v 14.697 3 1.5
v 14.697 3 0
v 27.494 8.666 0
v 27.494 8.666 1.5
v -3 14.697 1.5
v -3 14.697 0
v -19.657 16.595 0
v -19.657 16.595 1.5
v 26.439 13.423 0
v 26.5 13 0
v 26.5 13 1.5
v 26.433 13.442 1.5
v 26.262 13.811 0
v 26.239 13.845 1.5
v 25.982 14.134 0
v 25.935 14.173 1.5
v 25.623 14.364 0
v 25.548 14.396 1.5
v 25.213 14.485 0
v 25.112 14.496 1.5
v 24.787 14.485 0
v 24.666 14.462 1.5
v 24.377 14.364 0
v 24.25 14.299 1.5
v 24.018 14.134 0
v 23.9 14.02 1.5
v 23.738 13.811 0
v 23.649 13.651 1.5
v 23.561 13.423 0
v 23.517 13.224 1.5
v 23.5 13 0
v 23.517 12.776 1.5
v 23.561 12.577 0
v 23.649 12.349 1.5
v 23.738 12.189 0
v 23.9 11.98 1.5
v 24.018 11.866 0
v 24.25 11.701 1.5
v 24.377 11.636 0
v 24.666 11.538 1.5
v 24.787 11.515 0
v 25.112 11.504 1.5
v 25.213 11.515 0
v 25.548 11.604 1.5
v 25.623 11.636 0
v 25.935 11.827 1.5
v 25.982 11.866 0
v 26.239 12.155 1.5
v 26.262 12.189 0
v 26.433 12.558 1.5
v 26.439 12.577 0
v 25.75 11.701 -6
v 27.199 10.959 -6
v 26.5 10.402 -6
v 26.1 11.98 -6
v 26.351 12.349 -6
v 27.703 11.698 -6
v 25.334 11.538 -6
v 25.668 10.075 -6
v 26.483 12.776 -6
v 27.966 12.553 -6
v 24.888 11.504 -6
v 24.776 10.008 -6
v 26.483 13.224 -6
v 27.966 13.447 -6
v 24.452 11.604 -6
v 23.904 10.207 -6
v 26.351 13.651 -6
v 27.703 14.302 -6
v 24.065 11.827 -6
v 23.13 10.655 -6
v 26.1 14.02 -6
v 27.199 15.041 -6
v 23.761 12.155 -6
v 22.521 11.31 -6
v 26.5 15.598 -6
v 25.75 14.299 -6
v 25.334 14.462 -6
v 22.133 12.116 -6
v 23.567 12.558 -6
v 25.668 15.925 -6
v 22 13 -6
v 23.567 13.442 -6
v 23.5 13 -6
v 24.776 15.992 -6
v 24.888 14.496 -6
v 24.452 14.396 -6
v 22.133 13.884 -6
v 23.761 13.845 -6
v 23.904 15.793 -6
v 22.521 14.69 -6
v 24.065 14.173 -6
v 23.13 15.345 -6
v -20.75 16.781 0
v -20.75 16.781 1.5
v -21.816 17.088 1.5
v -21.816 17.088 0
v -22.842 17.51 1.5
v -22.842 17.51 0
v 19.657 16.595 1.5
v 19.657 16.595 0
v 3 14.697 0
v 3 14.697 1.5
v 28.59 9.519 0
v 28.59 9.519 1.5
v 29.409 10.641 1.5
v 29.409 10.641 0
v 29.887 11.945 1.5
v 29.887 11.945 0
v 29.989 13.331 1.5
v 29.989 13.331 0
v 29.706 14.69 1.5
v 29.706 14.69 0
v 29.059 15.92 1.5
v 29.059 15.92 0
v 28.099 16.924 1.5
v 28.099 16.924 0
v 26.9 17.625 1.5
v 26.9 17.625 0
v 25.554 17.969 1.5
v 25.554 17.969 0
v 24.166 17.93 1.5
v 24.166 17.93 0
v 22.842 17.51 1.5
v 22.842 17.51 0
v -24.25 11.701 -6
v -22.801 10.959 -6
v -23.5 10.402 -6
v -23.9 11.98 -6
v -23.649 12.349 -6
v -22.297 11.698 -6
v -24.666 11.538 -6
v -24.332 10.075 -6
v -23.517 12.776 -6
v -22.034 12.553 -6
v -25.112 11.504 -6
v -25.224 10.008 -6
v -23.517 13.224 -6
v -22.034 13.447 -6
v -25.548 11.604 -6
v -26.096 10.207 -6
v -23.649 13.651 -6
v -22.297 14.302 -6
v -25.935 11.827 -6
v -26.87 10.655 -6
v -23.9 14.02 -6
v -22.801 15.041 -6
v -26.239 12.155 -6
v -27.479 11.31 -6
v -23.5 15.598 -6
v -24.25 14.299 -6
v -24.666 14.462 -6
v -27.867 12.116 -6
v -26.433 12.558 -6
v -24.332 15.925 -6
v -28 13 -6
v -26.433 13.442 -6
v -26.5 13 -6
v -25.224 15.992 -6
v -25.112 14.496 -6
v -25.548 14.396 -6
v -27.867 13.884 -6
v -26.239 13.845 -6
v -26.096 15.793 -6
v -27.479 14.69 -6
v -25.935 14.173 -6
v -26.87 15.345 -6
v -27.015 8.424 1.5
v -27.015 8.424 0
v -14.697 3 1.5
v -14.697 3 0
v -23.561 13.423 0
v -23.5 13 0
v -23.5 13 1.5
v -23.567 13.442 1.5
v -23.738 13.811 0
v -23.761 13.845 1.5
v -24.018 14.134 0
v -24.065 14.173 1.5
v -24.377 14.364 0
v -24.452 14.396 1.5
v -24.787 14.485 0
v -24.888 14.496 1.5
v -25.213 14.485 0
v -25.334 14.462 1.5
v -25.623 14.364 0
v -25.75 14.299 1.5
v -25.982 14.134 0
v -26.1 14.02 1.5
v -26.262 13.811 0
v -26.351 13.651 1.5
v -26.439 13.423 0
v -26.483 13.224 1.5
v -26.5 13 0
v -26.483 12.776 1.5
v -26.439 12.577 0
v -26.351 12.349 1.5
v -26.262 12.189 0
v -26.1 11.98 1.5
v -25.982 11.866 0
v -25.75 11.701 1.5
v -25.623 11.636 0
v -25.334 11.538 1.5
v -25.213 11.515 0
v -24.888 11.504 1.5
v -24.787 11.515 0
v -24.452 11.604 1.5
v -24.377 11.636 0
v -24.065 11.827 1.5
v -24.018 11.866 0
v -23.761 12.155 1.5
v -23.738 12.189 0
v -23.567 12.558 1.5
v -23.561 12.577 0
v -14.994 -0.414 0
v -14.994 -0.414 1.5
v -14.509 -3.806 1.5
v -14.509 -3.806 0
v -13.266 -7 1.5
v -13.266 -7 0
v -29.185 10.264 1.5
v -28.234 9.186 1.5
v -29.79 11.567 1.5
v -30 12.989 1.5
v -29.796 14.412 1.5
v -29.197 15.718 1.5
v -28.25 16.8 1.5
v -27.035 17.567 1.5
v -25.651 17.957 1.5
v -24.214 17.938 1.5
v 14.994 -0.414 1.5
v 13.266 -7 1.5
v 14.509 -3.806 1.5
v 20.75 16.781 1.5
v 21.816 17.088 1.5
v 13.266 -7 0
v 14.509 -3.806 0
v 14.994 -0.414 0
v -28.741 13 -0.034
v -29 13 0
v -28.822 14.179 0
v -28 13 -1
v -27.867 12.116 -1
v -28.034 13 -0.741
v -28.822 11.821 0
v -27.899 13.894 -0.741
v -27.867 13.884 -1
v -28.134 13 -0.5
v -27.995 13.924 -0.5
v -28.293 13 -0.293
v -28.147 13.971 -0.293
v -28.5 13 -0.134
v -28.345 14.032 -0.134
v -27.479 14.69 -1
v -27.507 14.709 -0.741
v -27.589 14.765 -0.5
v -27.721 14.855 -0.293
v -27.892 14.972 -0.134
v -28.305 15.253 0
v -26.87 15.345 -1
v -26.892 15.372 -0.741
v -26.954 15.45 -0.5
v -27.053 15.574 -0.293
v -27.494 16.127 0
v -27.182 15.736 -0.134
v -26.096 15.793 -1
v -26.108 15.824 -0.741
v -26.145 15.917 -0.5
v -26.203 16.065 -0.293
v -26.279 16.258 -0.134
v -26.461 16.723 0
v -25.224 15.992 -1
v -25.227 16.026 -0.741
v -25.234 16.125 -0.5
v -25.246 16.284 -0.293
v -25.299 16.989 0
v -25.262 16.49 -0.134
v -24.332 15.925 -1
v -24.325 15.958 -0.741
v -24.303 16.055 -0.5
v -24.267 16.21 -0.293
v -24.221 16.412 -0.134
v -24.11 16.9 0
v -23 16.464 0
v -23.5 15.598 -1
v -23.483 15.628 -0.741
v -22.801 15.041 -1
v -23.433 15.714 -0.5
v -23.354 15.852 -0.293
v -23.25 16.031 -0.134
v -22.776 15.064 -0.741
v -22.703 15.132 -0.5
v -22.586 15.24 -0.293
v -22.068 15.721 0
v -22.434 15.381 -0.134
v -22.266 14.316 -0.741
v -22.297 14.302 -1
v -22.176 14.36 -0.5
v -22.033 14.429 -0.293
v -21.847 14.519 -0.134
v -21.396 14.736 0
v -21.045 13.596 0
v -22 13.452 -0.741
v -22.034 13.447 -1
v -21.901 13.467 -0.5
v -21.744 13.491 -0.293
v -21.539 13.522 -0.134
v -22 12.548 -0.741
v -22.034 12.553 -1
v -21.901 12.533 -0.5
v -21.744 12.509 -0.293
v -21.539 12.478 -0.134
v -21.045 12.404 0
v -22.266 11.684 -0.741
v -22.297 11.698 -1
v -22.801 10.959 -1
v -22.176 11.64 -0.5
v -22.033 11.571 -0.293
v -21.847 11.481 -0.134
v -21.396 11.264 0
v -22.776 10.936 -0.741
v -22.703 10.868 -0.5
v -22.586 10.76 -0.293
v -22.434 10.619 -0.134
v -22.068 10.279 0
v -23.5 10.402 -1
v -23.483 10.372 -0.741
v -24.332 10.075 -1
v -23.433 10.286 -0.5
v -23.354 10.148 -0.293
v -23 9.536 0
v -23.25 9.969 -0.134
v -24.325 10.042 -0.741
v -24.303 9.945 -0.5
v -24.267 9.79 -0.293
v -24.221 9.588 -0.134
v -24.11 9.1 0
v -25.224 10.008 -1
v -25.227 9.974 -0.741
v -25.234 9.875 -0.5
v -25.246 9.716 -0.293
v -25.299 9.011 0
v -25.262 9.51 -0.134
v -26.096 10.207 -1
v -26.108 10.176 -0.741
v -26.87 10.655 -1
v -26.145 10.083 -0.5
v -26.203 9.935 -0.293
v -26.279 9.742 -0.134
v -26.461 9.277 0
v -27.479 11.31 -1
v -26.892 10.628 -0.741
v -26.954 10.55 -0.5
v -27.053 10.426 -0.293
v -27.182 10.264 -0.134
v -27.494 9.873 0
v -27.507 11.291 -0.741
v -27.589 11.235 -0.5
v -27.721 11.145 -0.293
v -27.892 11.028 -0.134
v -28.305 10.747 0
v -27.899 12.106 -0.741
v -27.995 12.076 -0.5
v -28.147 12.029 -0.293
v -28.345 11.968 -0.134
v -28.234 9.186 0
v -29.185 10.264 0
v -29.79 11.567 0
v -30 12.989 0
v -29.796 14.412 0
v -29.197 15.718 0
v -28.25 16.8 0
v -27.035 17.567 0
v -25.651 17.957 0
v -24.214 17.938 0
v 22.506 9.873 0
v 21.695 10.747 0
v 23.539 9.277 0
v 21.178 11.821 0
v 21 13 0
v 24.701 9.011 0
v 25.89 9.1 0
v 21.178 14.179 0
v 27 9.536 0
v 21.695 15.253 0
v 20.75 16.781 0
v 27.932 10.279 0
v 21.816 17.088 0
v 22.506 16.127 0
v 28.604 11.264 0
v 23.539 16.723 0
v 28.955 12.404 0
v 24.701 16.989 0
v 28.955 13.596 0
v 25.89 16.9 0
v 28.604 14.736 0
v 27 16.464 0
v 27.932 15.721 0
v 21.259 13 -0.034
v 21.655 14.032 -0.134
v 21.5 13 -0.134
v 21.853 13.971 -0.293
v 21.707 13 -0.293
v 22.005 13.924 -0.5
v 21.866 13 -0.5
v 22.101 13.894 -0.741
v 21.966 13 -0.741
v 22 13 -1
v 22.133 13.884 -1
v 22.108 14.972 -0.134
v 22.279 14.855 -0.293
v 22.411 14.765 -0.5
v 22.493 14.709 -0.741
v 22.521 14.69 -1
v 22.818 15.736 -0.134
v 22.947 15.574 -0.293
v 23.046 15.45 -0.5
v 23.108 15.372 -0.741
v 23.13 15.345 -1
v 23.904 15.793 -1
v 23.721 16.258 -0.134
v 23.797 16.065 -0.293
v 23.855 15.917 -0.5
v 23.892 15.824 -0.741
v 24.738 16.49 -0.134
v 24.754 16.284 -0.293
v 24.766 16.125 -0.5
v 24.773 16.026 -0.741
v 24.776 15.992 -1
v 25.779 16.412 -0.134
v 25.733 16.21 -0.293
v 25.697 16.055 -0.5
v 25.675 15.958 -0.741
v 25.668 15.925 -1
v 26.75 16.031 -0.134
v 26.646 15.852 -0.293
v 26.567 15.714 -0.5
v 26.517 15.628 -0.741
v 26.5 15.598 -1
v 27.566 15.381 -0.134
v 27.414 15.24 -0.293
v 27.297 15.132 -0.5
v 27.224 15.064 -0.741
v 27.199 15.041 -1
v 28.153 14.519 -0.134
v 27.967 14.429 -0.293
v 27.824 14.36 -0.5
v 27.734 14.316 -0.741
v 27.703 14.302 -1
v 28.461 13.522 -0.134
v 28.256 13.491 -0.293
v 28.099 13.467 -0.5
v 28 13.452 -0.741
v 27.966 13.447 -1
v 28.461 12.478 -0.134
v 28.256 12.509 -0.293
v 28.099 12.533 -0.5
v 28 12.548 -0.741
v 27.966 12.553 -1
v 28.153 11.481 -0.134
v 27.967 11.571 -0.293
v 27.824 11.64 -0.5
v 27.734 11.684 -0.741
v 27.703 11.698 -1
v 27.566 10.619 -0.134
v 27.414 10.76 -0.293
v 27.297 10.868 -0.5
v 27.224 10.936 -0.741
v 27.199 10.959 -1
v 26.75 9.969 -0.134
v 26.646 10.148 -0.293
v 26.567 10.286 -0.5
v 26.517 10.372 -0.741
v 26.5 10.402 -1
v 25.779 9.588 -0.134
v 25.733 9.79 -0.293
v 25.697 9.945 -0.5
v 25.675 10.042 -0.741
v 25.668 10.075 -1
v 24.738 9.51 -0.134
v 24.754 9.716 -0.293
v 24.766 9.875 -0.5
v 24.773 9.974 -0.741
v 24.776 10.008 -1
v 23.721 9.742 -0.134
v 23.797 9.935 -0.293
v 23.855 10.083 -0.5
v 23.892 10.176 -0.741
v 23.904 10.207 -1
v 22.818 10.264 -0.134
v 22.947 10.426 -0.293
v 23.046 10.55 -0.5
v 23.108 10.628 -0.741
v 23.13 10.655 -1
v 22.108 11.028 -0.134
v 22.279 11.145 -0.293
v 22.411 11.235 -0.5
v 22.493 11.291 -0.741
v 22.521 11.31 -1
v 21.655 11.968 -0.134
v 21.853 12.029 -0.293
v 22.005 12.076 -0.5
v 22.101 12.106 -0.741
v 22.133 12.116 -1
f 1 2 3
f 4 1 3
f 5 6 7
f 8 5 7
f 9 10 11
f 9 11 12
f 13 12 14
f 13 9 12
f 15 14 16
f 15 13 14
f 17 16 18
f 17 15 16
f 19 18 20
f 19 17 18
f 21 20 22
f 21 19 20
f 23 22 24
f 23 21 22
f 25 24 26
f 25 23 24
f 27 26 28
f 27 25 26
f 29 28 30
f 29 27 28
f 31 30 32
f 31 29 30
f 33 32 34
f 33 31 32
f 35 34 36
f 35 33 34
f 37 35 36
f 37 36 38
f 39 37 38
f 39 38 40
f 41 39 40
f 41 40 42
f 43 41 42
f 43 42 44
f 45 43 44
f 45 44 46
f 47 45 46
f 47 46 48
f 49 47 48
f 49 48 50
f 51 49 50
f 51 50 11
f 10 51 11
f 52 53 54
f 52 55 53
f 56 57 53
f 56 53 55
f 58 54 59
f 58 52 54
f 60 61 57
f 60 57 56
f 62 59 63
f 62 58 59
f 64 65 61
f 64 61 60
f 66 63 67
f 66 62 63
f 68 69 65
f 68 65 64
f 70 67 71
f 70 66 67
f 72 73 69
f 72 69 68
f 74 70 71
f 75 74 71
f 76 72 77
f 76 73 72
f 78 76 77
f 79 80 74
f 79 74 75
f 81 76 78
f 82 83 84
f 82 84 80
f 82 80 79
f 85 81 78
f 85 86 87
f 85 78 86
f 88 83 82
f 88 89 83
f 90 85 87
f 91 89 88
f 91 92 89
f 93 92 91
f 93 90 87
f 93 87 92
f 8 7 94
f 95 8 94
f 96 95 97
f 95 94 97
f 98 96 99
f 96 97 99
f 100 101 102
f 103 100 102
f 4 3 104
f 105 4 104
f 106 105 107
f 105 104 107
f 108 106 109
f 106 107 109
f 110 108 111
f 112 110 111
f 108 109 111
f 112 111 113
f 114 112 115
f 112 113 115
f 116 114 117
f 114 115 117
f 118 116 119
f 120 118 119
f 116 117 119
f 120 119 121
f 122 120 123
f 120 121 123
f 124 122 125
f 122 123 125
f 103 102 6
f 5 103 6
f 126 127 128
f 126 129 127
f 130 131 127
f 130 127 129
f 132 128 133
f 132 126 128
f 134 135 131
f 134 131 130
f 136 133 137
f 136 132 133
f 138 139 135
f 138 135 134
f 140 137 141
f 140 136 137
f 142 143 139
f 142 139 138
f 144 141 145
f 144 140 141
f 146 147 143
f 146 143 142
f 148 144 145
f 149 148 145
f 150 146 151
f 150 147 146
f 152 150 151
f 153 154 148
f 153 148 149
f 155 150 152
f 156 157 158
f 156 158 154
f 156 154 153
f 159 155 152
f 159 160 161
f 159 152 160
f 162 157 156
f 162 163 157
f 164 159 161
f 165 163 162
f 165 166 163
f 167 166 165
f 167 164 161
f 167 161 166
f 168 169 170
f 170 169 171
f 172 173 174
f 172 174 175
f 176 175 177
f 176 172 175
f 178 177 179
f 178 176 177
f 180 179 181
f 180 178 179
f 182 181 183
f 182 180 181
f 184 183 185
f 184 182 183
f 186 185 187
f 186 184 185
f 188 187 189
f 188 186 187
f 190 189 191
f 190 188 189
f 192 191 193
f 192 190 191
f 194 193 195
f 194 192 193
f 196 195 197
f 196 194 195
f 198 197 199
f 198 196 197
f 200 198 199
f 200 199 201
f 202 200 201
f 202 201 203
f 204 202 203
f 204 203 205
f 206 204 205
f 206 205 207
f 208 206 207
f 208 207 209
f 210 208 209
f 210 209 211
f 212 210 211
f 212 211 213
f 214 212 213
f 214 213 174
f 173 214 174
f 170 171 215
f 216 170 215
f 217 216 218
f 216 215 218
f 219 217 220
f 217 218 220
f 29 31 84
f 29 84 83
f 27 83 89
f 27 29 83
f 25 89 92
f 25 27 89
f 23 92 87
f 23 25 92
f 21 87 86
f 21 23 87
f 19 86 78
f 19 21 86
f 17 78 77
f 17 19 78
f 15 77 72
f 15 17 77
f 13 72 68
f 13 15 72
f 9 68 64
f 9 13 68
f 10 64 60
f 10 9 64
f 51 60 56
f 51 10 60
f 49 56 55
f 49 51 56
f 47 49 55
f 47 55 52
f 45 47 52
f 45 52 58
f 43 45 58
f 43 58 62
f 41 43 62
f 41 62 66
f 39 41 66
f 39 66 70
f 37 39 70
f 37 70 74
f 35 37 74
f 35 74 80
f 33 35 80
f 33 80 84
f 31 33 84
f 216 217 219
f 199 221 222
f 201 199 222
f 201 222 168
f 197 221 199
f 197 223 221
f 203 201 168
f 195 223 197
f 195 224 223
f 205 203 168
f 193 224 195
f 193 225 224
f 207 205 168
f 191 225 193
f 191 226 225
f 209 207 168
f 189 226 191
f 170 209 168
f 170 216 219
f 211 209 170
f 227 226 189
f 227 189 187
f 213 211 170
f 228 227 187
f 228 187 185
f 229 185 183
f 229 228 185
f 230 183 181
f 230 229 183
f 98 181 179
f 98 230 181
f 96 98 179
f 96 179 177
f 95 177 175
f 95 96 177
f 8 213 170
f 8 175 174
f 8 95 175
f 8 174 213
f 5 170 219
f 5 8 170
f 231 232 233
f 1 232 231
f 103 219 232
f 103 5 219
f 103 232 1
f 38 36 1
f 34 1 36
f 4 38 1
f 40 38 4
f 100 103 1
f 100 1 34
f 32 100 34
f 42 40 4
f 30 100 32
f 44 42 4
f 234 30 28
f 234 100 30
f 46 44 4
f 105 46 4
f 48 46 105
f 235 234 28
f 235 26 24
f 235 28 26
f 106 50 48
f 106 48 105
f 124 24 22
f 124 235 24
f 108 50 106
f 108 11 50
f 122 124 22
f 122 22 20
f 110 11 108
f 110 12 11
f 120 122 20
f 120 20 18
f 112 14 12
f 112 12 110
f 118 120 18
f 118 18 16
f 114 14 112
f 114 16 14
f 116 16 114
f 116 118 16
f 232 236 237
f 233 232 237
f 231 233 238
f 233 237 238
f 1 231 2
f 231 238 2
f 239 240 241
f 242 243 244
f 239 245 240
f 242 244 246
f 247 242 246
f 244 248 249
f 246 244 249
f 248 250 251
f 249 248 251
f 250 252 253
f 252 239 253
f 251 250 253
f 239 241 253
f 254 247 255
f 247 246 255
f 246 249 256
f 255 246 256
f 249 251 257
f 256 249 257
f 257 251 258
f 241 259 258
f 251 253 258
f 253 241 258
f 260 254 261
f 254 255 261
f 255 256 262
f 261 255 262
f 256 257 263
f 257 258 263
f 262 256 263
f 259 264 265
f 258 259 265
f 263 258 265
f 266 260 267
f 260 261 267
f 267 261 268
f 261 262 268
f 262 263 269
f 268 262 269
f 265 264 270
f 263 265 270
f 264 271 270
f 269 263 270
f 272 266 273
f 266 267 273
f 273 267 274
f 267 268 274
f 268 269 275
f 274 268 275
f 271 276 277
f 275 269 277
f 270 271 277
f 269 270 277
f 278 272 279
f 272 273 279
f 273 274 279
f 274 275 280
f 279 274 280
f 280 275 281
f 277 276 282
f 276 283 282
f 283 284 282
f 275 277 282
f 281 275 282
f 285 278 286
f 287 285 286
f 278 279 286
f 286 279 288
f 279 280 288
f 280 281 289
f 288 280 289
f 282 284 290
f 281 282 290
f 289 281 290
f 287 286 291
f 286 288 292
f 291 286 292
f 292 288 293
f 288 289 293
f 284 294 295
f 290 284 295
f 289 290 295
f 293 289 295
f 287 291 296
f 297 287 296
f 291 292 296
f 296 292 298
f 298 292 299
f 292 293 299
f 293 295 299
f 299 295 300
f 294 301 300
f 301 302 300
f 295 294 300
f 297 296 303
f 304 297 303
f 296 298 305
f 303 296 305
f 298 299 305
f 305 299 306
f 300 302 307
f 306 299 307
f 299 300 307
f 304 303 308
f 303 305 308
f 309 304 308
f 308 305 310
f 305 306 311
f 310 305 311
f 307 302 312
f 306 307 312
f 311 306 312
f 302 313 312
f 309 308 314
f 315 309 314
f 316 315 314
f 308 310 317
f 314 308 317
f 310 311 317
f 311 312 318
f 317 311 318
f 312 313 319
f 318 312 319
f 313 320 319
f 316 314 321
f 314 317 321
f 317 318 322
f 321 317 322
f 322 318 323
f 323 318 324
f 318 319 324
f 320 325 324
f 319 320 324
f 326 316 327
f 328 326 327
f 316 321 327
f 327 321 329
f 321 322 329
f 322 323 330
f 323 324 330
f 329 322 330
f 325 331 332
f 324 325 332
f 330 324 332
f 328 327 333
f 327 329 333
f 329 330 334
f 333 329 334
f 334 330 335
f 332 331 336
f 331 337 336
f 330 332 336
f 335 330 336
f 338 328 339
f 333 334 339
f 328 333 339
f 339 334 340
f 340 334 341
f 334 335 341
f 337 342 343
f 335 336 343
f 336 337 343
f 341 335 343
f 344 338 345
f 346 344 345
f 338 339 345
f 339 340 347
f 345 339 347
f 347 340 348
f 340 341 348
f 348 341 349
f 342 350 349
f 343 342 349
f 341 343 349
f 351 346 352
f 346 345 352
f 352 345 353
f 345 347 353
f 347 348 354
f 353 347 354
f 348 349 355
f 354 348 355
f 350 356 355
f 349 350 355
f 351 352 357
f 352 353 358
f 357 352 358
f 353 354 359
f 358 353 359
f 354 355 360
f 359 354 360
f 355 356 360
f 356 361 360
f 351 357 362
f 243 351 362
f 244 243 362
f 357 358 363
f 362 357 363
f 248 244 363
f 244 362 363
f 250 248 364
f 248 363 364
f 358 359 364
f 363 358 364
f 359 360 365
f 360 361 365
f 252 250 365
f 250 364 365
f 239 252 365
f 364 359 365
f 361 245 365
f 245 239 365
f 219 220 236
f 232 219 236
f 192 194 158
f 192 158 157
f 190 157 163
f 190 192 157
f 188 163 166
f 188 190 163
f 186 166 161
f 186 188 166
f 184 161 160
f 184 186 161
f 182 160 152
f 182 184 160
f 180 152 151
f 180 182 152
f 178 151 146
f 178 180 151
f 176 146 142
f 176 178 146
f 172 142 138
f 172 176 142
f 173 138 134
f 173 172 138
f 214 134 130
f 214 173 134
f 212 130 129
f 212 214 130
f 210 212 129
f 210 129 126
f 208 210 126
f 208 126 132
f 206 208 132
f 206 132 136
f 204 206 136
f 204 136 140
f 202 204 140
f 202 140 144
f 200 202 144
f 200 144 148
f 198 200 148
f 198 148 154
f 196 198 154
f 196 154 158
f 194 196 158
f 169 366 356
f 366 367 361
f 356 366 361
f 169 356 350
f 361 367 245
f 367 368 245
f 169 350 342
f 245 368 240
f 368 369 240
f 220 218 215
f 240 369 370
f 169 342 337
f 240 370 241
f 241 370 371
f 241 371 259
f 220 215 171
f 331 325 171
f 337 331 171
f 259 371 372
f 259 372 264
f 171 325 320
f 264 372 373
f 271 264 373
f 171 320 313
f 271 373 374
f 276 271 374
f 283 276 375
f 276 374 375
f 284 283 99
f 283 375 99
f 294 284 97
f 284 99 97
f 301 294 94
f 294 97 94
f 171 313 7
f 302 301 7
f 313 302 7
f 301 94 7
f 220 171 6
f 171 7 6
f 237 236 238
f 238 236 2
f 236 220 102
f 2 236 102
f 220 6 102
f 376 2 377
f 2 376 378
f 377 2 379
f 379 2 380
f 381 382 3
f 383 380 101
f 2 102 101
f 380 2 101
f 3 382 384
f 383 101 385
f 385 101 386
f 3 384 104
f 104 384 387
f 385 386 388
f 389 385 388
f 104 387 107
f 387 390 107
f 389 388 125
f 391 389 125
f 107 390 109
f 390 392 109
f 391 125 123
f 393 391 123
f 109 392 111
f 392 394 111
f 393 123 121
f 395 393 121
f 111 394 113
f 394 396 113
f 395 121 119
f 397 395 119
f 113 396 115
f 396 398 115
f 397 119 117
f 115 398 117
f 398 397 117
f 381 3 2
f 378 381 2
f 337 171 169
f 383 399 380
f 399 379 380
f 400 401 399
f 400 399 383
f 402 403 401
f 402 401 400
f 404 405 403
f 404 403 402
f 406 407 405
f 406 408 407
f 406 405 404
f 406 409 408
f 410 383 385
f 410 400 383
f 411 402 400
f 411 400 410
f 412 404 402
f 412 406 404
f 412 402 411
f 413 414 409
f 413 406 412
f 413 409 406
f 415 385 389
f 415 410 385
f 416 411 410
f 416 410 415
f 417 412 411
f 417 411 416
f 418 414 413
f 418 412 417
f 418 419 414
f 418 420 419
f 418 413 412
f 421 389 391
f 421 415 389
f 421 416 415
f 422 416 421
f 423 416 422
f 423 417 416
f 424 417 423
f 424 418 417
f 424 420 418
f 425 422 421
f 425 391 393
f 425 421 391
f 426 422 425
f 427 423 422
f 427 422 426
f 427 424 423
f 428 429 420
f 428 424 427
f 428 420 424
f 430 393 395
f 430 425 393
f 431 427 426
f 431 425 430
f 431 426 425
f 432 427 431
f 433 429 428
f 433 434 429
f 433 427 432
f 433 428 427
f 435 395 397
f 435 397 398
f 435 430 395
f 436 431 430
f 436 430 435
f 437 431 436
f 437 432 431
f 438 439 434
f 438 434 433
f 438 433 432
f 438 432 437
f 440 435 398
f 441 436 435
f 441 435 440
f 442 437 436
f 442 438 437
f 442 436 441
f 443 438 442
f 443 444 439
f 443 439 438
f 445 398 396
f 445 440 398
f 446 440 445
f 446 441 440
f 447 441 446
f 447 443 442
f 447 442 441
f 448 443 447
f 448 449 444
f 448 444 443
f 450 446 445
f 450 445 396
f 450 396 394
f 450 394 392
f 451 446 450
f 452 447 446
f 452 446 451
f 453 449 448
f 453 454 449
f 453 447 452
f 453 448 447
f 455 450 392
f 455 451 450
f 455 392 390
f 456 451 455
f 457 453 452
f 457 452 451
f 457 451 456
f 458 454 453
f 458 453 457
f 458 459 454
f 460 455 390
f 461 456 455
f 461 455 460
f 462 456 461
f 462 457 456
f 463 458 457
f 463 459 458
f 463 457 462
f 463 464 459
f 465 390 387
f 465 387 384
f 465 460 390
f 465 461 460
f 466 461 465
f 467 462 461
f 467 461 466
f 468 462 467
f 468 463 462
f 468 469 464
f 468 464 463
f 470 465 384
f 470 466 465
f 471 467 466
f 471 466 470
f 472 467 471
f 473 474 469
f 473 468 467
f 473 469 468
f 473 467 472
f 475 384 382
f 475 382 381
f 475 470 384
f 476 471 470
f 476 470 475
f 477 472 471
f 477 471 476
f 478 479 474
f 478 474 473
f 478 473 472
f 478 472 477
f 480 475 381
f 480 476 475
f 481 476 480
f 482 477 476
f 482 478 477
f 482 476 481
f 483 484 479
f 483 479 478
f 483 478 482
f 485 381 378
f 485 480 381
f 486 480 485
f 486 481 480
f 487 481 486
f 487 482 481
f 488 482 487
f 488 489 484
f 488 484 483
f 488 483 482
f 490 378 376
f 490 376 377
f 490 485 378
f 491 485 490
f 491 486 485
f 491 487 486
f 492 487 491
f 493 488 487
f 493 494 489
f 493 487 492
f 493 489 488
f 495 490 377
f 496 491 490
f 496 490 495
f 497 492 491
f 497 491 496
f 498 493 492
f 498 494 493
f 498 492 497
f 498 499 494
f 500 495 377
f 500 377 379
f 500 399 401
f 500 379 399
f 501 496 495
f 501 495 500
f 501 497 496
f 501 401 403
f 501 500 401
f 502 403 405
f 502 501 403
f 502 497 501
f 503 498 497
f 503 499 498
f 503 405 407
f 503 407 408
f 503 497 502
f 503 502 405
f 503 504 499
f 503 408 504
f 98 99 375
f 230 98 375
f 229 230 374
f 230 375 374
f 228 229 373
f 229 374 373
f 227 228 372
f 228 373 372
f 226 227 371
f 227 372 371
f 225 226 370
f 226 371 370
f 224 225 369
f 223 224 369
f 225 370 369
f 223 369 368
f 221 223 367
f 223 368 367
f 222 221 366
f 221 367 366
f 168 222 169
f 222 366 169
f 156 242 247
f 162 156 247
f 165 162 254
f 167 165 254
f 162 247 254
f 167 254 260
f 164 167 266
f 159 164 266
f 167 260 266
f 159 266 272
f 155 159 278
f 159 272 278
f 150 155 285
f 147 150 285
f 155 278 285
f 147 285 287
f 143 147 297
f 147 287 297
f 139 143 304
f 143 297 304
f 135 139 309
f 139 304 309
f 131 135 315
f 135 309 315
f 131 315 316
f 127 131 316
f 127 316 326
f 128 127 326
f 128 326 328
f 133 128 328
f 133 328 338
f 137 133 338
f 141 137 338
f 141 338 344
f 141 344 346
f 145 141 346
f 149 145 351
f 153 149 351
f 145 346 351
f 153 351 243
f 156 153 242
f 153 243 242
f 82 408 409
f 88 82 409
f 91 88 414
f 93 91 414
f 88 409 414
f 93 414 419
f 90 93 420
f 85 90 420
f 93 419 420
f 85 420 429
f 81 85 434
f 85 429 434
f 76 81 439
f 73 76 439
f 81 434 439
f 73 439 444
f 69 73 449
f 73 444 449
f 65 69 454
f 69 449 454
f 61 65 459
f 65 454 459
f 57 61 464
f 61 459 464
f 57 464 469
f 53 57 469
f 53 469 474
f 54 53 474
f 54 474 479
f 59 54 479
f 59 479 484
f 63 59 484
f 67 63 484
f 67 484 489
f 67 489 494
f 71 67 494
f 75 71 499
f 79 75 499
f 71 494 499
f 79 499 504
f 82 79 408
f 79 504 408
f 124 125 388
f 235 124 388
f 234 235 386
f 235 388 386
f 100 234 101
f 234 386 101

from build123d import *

# Parameters (mm, degrees)
SKETCH_1_R      = 1.5
EXTRUDE_1_DEPTH = 1.5
SKETCH_4_R      = 3
SKETCH_4_R_2    = 1.5
EXTRUDE_2_DEPTH = 6
FILLET_1_R      = 1


with BuildPart() as part:
    # Эскиз1 → Бобышка-Вытянуть1 (new body)
    with BuildSketch(Plane.XY):
        with BuildLine():
            ThreePointArc((-14.696938457, 3), (-14.848853857, -2.124038405), (-13.266499161, -7))
            Line((-13.266499161, -7), (13.266499161, -7))
            ThreePointArc((13.266499161, -7), (14.848853857, -2.124038405), (14.696938457, 3))
            Line((14.696938457, 3), (27.493638863, 8.666206601))
            ThreePointArc((27.493638863, 8.666206601), (29.425159504, 15.327651899), (22.841677521, 17.51017118))
            ThreePointArc((22.841677521, 17.51017118), (21.287556094, 16.919662188), (19.657078674, 16.594796577))
            Line((19.657078674, 16.594796577), (3, 14.696938457))
            Line((3, 14.696938457), (-3, 14.696938457))
            Line((-3, 14.696938457), (-19.657078674, 16.594796577))
            ThreePointArc((-19.657078674, 16.594796577), (-21.287556094, 16.919662188), (-22.841677521, 17.51017118))
            ThreePointArc((-22.841677521, 17.51017118), (-29.543661072, 15.086898192), (-27.014954435, 8.423980045))
            Line((-27.014954435, 8.423980045), (-14.696938457, 3))
        make_face()
        with Locations((-25, 13)):
            Circle(SKETCH_1_R, mode=Mode.SUBTRACT)
        with Locations((25, 13)):
            Circle(SKETCH_1_R, mode=Mode.SUBTRACT)
    extrude(amount=EXTRUDE_1_DEPTH)

    # Эскиз4 → Бобышка-Вытянуть2 (add)
    with BuildSketch(Plane(origin=(0, 0, 0), x_dir=(-1, 0, 0), z_dir=(0, 0, -1))):
        with Locations((25, 13)):
            Circle(SKETCH_4_R)
        with Locations((25, 13)):
            Circle(SKETCH_4_R_2, mode=Mode.SUBTRACT)
        with Locations((-25, 13)):
            Circle(SKETCH_4_R)
        with Locations((-25, 13)):
            Circle(SKETCH_4_R_2, mode=Mode.SUBTRACT)
    extrude(amount=EXTRUDE_2_DEPTH)

    # Скругление1
    fillet_1_edges = [part.edges().sort_by_distance(p)[0] for p in [
        (-22, 13, 0),
        (28, 13, 0),
    ]]
    fillet(fillet_1_edges, radius=FILLET_1_R)


solid = part.part
